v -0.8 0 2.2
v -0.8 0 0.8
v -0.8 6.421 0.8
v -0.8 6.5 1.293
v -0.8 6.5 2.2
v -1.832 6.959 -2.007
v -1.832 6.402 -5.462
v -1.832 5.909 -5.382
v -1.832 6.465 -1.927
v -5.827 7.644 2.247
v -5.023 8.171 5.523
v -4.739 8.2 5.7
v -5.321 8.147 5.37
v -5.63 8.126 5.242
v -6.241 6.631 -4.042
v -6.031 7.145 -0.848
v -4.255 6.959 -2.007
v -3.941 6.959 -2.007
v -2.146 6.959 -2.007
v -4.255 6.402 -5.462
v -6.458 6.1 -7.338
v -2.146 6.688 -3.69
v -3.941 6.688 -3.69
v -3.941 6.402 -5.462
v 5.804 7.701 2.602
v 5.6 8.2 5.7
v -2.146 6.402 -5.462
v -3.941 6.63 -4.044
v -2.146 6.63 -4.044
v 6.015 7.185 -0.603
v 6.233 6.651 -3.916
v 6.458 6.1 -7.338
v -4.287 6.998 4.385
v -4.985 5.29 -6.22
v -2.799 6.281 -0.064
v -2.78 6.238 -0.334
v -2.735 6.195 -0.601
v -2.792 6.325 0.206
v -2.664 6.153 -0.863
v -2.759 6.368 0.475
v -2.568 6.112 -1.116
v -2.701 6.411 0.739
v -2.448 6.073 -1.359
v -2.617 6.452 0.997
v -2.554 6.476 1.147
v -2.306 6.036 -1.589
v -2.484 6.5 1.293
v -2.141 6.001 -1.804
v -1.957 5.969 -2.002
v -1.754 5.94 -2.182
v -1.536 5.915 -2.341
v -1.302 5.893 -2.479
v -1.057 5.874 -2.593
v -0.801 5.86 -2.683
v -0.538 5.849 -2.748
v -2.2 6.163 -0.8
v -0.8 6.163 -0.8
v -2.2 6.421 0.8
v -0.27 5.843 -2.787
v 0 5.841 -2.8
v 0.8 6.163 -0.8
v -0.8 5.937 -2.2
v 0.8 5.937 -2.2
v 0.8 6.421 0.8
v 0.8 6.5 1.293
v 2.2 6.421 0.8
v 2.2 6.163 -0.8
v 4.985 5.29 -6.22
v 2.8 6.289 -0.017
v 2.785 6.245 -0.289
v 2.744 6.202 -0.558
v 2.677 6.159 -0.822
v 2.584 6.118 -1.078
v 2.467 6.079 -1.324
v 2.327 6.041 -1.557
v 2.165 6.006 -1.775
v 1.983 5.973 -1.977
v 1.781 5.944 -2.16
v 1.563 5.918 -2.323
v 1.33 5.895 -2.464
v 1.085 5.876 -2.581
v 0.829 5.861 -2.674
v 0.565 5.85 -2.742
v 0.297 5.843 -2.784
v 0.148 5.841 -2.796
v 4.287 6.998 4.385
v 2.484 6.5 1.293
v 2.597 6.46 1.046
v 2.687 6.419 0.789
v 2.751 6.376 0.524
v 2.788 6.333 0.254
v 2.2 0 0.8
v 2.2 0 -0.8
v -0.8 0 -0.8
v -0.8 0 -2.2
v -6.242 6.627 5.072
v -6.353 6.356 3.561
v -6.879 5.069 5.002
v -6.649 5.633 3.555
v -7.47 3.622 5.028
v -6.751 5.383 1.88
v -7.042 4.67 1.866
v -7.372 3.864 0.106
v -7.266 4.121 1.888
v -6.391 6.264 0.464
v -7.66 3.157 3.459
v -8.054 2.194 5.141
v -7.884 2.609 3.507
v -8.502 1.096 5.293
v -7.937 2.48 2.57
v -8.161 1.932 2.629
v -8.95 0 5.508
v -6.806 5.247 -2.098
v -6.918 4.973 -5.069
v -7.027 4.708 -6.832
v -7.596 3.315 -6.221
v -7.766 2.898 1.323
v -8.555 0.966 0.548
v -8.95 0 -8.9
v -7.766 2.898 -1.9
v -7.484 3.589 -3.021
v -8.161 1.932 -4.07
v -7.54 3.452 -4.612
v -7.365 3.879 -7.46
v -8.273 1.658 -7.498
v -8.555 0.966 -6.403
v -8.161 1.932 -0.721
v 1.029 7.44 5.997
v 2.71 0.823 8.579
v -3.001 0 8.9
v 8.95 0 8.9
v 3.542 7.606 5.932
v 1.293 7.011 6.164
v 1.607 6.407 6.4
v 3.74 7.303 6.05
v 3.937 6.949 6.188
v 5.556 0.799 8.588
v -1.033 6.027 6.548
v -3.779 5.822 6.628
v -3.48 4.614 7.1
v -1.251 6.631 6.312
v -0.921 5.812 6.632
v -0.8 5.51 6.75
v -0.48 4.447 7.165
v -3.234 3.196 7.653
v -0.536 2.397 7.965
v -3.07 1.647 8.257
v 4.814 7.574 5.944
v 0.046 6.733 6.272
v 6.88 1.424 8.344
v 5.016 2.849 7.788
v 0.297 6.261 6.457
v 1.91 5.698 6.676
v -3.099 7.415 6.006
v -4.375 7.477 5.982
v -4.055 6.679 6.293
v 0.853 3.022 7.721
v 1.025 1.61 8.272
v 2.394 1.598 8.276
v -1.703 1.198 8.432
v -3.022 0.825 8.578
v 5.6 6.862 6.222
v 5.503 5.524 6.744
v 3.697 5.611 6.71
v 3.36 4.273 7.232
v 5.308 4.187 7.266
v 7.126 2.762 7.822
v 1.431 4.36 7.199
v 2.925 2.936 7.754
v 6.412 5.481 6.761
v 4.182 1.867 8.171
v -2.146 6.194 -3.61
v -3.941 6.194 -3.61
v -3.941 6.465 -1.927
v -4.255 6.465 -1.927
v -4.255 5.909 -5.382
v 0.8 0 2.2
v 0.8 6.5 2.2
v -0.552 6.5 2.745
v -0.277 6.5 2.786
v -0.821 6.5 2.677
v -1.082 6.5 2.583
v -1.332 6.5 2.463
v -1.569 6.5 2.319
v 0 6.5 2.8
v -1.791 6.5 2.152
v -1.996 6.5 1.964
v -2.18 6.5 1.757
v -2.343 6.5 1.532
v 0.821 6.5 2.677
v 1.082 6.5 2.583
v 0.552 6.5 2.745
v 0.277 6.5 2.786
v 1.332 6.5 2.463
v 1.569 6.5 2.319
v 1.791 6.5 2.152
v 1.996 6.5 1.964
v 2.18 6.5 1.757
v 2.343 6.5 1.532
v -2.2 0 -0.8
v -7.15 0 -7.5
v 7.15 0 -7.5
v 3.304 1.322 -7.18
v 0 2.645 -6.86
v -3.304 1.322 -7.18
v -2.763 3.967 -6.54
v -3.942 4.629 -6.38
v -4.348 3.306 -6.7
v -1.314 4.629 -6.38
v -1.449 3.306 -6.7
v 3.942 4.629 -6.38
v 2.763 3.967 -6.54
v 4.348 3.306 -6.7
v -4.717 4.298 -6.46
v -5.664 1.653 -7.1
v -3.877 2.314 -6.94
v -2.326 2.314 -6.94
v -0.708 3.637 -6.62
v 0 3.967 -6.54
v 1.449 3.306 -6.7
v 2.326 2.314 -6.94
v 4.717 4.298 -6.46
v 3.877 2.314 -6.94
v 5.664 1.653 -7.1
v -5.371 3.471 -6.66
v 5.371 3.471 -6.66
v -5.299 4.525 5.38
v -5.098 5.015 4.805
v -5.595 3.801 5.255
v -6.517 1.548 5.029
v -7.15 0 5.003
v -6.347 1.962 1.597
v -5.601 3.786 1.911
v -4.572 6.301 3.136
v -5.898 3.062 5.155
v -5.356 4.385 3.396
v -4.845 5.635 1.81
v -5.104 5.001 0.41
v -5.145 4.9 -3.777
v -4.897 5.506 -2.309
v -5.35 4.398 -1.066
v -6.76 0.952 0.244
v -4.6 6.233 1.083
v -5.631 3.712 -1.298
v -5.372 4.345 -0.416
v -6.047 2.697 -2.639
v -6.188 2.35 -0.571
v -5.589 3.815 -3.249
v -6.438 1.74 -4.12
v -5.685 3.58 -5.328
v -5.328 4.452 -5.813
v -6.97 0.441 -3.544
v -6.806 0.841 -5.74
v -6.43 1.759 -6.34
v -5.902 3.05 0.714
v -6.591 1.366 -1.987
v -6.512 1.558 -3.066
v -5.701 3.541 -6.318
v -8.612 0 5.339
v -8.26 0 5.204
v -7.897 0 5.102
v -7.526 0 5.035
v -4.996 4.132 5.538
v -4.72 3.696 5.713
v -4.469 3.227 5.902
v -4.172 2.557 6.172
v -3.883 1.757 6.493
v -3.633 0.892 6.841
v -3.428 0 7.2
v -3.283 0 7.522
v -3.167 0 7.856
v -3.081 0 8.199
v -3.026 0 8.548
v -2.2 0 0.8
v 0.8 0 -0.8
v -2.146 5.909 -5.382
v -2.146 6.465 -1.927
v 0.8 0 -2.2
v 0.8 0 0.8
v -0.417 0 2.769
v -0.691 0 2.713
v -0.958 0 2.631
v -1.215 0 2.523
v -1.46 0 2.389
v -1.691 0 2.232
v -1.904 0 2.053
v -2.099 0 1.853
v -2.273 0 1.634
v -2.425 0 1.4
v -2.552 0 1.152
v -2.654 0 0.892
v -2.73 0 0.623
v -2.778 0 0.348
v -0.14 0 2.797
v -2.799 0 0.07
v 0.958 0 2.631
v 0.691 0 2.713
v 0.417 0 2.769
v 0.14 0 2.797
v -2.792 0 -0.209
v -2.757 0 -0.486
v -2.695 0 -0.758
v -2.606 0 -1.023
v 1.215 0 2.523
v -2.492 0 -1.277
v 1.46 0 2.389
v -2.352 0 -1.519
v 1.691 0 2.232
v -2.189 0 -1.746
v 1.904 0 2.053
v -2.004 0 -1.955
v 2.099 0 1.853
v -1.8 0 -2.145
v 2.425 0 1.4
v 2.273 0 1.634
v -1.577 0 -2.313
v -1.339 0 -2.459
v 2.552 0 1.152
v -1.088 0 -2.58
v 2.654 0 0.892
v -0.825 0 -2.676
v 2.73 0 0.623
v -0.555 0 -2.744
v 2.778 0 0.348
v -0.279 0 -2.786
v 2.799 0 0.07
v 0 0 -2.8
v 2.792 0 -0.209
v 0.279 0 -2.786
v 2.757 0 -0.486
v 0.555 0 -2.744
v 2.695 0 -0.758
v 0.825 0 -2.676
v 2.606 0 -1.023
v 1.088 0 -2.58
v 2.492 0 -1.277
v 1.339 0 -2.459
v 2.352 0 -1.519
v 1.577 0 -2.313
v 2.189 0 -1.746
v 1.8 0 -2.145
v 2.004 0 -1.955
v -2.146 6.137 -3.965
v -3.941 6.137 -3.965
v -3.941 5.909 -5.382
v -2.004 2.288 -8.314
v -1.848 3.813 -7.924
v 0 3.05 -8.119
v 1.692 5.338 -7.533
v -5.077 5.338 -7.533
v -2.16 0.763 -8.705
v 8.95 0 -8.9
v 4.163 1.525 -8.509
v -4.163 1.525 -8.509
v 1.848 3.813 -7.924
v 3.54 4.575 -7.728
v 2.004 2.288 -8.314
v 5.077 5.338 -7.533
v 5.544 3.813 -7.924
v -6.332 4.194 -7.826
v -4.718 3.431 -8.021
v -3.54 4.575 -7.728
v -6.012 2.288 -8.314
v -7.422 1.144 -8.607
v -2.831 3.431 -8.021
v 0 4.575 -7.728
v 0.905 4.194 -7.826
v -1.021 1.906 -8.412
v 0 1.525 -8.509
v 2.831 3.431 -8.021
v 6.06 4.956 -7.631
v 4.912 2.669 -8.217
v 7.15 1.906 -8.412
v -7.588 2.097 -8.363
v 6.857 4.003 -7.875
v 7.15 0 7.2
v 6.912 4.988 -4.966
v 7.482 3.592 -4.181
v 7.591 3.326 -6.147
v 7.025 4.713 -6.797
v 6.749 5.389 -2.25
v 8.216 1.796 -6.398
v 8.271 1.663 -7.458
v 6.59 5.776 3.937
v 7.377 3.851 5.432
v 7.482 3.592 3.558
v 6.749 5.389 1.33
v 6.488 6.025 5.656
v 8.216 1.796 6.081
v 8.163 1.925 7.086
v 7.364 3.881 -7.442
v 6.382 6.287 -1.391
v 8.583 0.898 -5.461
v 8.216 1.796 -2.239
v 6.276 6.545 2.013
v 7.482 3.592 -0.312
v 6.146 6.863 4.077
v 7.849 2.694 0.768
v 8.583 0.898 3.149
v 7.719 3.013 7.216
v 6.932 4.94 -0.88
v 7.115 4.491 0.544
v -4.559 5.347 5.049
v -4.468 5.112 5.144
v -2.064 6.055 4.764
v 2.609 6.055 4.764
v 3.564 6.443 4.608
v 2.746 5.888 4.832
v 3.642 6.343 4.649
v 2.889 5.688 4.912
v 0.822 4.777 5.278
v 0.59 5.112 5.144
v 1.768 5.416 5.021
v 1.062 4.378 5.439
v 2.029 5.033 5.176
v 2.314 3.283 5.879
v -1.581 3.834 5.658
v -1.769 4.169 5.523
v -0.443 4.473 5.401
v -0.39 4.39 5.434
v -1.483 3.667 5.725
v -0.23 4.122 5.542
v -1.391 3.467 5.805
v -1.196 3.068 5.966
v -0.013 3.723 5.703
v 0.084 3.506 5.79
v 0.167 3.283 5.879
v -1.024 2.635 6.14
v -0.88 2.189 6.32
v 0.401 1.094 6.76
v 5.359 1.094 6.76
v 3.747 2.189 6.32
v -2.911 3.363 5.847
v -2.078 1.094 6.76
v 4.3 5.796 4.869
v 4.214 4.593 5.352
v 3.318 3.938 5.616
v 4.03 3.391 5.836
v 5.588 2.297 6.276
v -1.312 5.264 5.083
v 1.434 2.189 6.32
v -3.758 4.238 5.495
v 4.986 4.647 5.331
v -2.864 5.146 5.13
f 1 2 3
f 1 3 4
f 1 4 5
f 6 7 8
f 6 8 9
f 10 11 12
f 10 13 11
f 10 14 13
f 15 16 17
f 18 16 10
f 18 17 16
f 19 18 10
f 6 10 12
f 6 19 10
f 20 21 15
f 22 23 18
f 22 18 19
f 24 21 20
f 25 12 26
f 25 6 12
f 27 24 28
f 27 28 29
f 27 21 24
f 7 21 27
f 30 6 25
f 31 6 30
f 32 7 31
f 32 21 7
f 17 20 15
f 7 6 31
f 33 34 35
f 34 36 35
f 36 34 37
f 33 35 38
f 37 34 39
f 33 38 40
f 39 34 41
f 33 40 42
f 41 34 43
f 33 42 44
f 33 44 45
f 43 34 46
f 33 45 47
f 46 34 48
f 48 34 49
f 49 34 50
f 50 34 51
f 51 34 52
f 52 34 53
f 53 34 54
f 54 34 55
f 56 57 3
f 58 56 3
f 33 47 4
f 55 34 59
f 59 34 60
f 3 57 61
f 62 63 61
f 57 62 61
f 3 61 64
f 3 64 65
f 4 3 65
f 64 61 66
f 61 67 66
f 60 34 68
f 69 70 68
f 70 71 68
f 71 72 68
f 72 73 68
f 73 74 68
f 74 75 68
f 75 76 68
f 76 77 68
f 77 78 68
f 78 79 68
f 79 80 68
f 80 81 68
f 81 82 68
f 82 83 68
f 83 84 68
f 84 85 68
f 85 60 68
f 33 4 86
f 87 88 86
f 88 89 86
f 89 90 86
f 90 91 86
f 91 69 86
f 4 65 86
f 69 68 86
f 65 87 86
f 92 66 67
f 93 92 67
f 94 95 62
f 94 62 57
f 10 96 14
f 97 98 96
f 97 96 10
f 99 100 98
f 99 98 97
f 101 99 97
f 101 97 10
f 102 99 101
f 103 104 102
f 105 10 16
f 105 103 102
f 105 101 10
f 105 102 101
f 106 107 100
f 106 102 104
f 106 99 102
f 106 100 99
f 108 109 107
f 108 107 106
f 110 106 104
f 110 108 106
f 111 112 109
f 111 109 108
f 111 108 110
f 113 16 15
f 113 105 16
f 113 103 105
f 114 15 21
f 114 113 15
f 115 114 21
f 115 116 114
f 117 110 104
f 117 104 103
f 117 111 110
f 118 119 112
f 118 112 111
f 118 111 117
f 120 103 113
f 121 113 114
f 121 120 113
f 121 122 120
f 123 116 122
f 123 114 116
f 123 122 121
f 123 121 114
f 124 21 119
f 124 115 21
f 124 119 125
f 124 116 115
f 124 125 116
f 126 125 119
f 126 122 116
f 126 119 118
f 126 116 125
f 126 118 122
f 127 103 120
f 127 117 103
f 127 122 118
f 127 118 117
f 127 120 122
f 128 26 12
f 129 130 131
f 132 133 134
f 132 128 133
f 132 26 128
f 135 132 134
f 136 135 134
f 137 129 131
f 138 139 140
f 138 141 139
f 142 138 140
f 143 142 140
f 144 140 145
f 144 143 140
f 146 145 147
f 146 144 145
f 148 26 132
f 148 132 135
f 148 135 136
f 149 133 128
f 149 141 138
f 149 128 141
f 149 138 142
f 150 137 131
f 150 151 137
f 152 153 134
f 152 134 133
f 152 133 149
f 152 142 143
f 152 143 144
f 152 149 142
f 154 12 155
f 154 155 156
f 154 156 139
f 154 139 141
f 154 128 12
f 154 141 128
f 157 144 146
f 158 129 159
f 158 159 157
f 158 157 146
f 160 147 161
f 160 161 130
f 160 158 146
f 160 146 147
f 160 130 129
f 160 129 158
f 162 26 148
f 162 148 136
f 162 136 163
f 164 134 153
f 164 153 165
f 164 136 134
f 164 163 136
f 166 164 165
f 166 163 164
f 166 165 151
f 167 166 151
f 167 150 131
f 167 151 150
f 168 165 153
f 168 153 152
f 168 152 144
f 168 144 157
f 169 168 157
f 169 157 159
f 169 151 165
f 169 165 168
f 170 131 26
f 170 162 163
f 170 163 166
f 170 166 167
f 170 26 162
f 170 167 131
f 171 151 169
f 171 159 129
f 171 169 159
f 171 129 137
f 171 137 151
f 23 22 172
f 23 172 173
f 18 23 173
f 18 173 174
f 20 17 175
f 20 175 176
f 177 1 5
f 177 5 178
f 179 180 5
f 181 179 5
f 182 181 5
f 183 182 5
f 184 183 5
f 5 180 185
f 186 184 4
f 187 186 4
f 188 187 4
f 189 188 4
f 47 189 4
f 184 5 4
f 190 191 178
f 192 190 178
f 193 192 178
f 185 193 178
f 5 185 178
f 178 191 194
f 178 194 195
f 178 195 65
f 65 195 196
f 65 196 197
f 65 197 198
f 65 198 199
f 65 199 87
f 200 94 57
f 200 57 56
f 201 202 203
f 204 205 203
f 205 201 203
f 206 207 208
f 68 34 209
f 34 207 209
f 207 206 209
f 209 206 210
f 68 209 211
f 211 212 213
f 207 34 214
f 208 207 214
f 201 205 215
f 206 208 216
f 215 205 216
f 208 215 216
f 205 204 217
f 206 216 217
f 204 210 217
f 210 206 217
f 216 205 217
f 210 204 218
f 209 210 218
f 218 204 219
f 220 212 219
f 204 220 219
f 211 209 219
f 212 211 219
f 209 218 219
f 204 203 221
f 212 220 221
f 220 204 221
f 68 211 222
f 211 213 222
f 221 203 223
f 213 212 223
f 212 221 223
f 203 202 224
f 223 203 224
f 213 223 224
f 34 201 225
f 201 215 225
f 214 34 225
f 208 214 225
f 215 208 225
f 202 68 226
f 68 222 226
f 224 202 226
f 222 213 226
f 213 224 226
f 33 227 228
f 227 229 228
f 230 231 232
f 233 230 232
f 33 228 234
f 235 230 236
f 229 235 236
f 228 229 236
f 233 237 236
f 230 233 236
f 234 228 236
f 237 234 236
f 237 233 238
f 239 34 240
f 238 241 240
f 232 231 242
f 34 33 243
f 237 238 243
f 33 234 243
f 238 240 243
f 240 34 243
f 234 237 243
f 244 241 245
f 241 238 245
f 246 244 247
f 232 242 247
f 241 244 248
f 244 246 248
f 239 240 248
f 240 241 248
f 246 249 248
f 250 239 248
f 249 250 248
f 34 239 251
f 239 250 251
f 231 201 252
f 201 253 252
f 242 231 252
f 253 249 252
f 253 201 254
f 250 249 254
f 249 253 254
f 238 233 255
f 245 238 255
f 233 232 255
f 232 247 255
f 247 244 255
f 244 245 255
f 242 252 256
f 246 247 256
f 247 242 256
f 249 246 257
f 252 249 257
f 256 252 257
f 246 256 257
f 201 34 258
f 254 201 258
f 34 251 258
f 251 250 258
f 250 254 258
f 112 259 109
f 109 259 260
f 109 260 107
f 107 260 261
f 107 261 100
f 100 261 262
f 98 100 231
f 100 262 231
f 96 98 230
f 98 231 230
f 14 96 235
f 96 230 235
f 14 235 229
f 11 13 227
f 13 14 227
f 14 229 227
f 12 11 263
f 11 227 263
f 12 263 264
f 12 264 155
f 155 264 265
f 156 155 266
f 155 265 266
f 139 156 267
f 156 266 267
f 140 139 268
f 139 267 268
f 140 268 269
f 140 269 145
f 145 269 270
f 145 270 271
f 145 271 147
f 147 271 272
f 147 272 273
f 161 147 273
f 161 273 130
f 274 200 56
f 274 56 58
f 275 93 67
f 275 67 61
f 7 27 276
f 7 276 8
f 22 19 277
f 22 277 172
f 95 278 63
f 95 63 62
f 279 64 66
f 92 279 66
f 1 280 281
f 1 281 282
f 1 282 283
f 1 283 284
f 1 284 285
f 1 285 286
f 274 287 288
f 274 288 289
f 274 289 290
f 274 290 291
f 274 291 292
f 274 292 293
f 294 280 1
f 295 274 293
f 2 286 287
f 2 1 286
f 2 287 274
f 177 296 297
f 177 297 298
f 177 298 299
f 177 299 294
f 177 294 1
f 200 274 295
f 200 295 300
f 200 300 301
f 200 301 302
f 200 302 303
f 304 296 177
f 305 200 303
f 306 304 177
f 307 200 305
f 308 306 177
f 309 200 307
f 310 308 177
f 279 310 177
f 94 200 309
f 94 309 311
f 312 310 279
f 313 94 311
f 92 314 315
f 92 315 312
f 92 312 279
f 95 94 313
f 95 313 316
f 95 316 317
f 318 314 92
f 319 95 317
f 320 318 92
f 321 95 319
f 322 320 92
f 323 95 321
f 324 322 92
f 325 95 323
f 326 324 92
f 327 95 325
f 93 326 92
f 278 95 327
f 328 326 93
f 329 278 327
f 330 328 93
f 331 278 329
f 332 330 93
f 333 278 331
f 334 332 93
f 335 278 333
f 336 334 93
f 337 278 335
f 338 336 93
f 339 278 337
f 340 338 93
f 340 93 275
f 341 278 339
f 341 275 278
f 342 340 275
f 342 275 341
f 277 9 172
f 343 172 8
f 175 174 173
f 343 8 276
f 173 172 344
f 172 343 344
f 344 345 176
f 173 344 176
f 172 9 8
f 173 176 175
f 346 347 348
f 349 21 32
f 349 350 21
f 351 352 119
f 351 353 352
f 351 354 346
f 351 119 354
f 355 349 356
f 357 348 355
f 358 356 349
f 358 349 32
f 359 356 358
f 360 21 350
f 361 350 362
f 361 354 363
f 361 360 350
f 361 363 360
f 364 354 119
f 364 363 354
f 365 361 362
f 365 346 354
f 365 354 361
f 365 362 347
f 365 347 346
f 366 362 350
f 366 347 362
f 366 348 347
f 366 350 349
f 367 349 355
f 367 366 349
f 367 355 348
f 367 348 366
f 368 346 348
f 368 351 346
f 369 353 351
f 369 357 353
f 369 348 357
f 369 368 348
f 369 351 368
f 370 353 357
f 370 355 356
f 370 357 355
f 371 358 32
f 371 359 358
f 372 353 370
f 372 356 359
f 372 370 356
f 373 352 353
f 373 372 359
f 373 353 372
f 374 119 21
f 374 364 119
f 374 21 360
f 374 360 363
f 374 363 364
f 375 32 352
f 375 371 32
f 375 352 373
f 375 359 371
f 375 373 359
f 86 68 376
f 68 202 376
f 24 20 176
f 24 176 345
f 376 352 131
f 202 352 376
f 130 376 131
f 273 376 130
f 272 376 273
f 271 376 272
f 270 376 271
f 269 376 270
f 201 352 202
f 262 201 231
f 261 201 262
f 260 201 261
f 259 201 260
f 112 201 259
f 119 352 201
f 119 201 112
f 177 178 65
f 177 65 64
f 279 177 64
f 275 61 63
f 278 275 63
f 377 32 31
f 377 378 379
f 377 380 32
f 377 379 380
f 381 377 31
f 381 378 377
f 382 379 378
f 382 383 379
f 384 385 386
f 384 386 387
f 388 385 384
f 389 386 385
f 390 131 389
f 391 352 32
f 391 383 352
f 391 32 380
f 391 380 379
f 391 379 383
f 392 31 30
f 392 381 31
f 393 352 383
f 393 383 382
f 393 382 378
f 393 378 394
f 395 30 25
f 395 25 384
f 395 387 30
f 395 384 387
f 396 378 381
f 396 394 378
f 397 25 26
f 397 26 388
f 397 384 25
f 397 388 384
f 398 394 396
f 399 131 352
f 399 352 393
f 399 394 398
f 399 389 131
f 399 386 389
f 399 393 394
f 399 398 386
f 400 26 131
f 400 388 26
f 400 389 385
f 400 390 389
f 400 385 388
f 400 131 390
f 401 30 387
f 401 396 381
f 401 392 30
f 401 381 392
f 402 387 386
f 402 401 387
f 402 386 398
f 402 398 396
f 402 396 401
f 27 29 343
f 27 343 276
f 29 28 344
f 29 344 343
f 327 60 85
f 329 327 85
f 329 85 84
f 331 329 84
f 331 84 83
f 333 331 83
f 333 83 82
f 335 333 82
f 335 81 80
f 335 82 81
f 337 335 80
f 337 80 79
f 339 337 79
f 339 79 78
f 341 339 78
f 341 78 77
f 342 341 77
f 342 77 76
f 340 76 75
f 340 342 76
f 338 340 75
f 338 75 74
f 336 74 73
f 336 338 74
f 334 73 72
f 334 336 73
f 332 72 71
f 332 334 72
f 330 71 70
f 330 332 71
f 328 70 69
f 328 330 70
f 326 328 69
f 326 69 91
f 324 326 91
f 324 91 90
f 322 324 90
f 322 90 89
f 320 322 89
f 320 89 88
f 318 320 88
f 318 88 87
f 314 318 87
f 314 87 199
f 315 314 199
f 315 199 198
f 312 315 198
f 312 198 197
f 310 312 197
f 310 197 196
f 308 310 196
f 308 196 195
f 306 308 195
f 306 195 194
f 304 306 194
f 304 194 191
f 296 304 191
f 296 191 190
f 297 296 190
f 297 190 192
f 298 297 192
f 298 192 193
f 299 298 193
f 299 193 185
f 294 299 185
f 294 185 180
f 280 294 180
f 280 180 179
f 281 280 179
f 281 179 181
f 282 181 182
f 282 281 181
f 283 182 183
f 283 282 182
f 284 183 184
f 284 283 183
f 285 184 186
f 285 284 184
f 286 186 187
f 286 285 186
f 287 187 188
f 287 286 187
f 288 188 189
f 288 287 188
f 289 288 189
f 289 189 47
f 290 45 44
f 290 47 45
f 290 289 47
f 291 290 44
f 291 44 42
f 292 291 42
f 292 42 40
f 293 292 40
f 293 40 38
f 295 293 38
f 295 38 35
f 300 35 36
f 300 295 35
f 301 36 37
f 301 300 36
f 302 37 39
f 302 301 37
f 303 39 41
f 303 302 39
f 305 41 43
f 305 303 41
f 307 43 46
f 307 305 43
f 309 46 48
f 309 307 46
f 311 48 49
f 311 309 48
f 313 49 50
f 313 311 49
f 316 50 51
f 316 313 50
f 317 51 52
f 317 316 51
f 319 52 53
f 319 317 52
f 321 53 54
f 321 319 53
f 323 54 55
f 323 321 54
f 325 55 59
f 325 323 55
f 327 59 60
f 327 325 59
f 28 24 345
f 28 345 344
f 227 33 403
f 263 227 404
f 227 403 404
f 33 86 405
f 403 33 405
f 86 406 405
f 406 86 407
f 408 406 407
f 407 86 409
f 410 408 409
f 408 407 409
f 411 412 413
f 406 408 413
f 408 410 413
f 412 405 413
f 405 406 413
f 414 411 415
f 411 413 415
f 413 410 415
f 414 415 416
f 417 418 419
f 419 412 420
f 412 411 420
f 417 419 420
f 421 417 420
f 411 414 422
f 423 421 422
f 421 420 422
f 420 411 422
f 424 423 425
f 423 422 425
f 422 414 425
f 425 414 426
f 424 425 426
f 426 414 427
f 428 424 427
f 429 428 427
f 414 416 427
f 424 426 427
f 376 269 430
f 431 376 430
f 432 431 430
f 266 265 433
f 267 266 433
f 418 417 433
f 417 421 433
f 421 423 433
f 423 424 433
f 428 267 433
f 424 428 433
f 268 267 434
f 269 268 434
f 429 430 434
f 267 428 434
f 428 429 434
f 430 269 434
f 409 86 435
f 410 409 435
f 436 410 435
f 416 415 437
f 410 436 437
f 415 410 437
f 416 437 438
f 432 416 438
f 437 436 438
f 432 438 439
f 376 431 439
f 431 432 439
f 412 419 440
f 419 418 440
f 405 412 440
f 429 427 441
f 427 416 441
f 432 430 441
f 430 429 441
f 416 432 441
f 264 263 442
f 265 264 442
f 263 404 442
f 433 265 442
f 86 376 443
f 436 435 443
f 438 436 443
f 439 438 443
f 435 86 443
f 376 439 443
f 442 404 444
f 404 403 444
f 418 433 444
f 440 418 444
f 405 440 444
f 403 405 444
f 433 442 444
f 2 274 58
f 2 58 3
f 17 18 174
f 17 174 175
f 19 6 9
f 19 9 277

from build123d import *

# Parameters (mm, degrees)
OTHER_START         = 7.189240539
OTHER_2_OUTLINE_W   = 16
OTHER_2_OUTLINE_H   = 16
OTHER_2_DEPTH       = 1.9877561
SKETCH_20_R         = 2.8
EXTRUDE_2_DEPTH     = 6.5
SKETCH_22_R         = 4
CUT_EXTRUDE_2_DEPTH = 9
CUT_EXTRUDE_3_DEPTH = 0.5


# Read off the part's stored shape, not the designer's step: 相交2
with BuildPart() as part:
    # 草图4 → Loft 1 section 0
    with BuildSketch(Plane(origin=(0, 8.2, 0), x_dir=(1, 0, 0), z_dir=(0, 1, 0))):
        with BuildLine():
            Line((-5.6, 6.8), (5.6, 6.8))
            Line((5.6, 6.8), (5.6, -5.7))
            Line((5.6, -5.7), (-5.6, -5.7))
            Line((-5.6, -5.7), (-5.6, 6.8))
        make_face()
    # 草图1 → Loft 1 section 1
    with BuildSketch(Plane(origin=(0, 0, 0), x_dir=(1, 0, 0), z_dir=(0, 1, 0))):
        with BuildLine():
            Line((-8.95, -8.9), (8.95, -8.9))
            Line((8.95, -8.9), (8.95, 8.9))
            Line((8.95, 8.9), (-8.95, 8.9))
            Line((-8.95, 8.9), (-8.95, -8.9))
        make_face()
    loft()

    # 相交2 outline → 相交2 (cut)
    with BuildSketch(Plane(origin=(0, 0, 0), x_dir=(1, 0, 0), z_dir=(0, 0.9872752829851917, -0.15902048800865198)).offset(OTHER_START)):
        Rectangle(OTHER_2_OUTLINE_W, OTHER_2_OUTLINE_H)
    extrude(amount=OTHER_2_DEPTH, mode=Mode.SUBTRACT)

    # 草图19 → Loft 1 2 section 0
    with BuildSketch(Plane(origin=(0, 6.132664073, -0.987788564), x_dir=(1, 0, 0), z_dir=(0, 0.9872752829851916, -0.15902048800865207))):
        with BuildLine():
            Line((-4.985089723, 5.299749211), (4.985089723, 5.299749211))
            Line((4.985089723, 5.299749211), (4.287230721, -5.442213697))
            Line((4.287230721, -5.442213697), (-4.287230721, -5.442213697))
            Line((-4.287230721, -5.442213697), (-4.985089723, 5.299749211))
        make_face()
    # 草图8 → Loft 1 2 section 1
    with BuildSketch(Plane.XZ):
        with BuildLine():
            Line((-7.15, 7.2), (7.15, 7.2))
            Line((7.15, 7.2), (7.15, -7.5))
            Line((7.15, -7.5), (-7.15, -7.5))
            Line((-7.15, -7.5), (-7.15, 7.2))
        make_face()
    loft(mode=Mode.SUBTRACT)

    # 草图20 → 凸台-拉伸2 (add)
    with BuildSketch(Plane.XZ):
        with Locations(Location((0, 0, 0), (0, 0, 270))):
            Circle(SKETCH_20_R)
        Polygon((-2.2, 0.8), (-0.8, 0.8), (-0.8, 2.2), (0.8, 2.2), (0.8, 0.8), (2.2, 0.8), (2.2, -0.8), (0.8, -0.8), (0.8, -2.2), (-0.8, -2.2), (-0.8, -0.8), (-2.2, -0.8), align=None, mode=Mode.SUBTRACT)
    extrude(amount=-EXTRUDE_2_DEPTH)

    # 草图22 → 切除-拉伸2 (cut)
    with BuildSketch(Plane.XZ):
        with Locations((-7, 9)):
            Circle(SKETCH_22_R)
    extrude(amount=-CUT_EXTRUDE_2_DEPTH, mode=Mode.SUBTRACT)

    # 草图23 → 切除-拉伸3 (cut)
    with BuildSketch(Plane(origin=(0, 7.097759487, -1.143236539), x_dir=(1, 0, 0), z_dir=(0, 0.9872752829851916, -0.15902048800865207))):
        Polygon((-4.255442902, 4.374408411), (-3.941340338, 4.374408411), (-3.941340338, 2.938510975), (-2.146468543, 2.938510975), (-2.146468543, 4.374408411), (-1.832365979, 4.374408411), (-1.832365979, 0.874408411), (-2.146468543, 0.874408411), (-2.146468543, 2.579536616), (-3.941340338, 2.579536616), (-3.941340338, 0.874408411), (-4.255442902, 0.874408411), align=None)
    extrude(amount=-CUT_EXTRUDE_3_DEPTH, mode=Mode.SUBTRACT)


solid = part.part
